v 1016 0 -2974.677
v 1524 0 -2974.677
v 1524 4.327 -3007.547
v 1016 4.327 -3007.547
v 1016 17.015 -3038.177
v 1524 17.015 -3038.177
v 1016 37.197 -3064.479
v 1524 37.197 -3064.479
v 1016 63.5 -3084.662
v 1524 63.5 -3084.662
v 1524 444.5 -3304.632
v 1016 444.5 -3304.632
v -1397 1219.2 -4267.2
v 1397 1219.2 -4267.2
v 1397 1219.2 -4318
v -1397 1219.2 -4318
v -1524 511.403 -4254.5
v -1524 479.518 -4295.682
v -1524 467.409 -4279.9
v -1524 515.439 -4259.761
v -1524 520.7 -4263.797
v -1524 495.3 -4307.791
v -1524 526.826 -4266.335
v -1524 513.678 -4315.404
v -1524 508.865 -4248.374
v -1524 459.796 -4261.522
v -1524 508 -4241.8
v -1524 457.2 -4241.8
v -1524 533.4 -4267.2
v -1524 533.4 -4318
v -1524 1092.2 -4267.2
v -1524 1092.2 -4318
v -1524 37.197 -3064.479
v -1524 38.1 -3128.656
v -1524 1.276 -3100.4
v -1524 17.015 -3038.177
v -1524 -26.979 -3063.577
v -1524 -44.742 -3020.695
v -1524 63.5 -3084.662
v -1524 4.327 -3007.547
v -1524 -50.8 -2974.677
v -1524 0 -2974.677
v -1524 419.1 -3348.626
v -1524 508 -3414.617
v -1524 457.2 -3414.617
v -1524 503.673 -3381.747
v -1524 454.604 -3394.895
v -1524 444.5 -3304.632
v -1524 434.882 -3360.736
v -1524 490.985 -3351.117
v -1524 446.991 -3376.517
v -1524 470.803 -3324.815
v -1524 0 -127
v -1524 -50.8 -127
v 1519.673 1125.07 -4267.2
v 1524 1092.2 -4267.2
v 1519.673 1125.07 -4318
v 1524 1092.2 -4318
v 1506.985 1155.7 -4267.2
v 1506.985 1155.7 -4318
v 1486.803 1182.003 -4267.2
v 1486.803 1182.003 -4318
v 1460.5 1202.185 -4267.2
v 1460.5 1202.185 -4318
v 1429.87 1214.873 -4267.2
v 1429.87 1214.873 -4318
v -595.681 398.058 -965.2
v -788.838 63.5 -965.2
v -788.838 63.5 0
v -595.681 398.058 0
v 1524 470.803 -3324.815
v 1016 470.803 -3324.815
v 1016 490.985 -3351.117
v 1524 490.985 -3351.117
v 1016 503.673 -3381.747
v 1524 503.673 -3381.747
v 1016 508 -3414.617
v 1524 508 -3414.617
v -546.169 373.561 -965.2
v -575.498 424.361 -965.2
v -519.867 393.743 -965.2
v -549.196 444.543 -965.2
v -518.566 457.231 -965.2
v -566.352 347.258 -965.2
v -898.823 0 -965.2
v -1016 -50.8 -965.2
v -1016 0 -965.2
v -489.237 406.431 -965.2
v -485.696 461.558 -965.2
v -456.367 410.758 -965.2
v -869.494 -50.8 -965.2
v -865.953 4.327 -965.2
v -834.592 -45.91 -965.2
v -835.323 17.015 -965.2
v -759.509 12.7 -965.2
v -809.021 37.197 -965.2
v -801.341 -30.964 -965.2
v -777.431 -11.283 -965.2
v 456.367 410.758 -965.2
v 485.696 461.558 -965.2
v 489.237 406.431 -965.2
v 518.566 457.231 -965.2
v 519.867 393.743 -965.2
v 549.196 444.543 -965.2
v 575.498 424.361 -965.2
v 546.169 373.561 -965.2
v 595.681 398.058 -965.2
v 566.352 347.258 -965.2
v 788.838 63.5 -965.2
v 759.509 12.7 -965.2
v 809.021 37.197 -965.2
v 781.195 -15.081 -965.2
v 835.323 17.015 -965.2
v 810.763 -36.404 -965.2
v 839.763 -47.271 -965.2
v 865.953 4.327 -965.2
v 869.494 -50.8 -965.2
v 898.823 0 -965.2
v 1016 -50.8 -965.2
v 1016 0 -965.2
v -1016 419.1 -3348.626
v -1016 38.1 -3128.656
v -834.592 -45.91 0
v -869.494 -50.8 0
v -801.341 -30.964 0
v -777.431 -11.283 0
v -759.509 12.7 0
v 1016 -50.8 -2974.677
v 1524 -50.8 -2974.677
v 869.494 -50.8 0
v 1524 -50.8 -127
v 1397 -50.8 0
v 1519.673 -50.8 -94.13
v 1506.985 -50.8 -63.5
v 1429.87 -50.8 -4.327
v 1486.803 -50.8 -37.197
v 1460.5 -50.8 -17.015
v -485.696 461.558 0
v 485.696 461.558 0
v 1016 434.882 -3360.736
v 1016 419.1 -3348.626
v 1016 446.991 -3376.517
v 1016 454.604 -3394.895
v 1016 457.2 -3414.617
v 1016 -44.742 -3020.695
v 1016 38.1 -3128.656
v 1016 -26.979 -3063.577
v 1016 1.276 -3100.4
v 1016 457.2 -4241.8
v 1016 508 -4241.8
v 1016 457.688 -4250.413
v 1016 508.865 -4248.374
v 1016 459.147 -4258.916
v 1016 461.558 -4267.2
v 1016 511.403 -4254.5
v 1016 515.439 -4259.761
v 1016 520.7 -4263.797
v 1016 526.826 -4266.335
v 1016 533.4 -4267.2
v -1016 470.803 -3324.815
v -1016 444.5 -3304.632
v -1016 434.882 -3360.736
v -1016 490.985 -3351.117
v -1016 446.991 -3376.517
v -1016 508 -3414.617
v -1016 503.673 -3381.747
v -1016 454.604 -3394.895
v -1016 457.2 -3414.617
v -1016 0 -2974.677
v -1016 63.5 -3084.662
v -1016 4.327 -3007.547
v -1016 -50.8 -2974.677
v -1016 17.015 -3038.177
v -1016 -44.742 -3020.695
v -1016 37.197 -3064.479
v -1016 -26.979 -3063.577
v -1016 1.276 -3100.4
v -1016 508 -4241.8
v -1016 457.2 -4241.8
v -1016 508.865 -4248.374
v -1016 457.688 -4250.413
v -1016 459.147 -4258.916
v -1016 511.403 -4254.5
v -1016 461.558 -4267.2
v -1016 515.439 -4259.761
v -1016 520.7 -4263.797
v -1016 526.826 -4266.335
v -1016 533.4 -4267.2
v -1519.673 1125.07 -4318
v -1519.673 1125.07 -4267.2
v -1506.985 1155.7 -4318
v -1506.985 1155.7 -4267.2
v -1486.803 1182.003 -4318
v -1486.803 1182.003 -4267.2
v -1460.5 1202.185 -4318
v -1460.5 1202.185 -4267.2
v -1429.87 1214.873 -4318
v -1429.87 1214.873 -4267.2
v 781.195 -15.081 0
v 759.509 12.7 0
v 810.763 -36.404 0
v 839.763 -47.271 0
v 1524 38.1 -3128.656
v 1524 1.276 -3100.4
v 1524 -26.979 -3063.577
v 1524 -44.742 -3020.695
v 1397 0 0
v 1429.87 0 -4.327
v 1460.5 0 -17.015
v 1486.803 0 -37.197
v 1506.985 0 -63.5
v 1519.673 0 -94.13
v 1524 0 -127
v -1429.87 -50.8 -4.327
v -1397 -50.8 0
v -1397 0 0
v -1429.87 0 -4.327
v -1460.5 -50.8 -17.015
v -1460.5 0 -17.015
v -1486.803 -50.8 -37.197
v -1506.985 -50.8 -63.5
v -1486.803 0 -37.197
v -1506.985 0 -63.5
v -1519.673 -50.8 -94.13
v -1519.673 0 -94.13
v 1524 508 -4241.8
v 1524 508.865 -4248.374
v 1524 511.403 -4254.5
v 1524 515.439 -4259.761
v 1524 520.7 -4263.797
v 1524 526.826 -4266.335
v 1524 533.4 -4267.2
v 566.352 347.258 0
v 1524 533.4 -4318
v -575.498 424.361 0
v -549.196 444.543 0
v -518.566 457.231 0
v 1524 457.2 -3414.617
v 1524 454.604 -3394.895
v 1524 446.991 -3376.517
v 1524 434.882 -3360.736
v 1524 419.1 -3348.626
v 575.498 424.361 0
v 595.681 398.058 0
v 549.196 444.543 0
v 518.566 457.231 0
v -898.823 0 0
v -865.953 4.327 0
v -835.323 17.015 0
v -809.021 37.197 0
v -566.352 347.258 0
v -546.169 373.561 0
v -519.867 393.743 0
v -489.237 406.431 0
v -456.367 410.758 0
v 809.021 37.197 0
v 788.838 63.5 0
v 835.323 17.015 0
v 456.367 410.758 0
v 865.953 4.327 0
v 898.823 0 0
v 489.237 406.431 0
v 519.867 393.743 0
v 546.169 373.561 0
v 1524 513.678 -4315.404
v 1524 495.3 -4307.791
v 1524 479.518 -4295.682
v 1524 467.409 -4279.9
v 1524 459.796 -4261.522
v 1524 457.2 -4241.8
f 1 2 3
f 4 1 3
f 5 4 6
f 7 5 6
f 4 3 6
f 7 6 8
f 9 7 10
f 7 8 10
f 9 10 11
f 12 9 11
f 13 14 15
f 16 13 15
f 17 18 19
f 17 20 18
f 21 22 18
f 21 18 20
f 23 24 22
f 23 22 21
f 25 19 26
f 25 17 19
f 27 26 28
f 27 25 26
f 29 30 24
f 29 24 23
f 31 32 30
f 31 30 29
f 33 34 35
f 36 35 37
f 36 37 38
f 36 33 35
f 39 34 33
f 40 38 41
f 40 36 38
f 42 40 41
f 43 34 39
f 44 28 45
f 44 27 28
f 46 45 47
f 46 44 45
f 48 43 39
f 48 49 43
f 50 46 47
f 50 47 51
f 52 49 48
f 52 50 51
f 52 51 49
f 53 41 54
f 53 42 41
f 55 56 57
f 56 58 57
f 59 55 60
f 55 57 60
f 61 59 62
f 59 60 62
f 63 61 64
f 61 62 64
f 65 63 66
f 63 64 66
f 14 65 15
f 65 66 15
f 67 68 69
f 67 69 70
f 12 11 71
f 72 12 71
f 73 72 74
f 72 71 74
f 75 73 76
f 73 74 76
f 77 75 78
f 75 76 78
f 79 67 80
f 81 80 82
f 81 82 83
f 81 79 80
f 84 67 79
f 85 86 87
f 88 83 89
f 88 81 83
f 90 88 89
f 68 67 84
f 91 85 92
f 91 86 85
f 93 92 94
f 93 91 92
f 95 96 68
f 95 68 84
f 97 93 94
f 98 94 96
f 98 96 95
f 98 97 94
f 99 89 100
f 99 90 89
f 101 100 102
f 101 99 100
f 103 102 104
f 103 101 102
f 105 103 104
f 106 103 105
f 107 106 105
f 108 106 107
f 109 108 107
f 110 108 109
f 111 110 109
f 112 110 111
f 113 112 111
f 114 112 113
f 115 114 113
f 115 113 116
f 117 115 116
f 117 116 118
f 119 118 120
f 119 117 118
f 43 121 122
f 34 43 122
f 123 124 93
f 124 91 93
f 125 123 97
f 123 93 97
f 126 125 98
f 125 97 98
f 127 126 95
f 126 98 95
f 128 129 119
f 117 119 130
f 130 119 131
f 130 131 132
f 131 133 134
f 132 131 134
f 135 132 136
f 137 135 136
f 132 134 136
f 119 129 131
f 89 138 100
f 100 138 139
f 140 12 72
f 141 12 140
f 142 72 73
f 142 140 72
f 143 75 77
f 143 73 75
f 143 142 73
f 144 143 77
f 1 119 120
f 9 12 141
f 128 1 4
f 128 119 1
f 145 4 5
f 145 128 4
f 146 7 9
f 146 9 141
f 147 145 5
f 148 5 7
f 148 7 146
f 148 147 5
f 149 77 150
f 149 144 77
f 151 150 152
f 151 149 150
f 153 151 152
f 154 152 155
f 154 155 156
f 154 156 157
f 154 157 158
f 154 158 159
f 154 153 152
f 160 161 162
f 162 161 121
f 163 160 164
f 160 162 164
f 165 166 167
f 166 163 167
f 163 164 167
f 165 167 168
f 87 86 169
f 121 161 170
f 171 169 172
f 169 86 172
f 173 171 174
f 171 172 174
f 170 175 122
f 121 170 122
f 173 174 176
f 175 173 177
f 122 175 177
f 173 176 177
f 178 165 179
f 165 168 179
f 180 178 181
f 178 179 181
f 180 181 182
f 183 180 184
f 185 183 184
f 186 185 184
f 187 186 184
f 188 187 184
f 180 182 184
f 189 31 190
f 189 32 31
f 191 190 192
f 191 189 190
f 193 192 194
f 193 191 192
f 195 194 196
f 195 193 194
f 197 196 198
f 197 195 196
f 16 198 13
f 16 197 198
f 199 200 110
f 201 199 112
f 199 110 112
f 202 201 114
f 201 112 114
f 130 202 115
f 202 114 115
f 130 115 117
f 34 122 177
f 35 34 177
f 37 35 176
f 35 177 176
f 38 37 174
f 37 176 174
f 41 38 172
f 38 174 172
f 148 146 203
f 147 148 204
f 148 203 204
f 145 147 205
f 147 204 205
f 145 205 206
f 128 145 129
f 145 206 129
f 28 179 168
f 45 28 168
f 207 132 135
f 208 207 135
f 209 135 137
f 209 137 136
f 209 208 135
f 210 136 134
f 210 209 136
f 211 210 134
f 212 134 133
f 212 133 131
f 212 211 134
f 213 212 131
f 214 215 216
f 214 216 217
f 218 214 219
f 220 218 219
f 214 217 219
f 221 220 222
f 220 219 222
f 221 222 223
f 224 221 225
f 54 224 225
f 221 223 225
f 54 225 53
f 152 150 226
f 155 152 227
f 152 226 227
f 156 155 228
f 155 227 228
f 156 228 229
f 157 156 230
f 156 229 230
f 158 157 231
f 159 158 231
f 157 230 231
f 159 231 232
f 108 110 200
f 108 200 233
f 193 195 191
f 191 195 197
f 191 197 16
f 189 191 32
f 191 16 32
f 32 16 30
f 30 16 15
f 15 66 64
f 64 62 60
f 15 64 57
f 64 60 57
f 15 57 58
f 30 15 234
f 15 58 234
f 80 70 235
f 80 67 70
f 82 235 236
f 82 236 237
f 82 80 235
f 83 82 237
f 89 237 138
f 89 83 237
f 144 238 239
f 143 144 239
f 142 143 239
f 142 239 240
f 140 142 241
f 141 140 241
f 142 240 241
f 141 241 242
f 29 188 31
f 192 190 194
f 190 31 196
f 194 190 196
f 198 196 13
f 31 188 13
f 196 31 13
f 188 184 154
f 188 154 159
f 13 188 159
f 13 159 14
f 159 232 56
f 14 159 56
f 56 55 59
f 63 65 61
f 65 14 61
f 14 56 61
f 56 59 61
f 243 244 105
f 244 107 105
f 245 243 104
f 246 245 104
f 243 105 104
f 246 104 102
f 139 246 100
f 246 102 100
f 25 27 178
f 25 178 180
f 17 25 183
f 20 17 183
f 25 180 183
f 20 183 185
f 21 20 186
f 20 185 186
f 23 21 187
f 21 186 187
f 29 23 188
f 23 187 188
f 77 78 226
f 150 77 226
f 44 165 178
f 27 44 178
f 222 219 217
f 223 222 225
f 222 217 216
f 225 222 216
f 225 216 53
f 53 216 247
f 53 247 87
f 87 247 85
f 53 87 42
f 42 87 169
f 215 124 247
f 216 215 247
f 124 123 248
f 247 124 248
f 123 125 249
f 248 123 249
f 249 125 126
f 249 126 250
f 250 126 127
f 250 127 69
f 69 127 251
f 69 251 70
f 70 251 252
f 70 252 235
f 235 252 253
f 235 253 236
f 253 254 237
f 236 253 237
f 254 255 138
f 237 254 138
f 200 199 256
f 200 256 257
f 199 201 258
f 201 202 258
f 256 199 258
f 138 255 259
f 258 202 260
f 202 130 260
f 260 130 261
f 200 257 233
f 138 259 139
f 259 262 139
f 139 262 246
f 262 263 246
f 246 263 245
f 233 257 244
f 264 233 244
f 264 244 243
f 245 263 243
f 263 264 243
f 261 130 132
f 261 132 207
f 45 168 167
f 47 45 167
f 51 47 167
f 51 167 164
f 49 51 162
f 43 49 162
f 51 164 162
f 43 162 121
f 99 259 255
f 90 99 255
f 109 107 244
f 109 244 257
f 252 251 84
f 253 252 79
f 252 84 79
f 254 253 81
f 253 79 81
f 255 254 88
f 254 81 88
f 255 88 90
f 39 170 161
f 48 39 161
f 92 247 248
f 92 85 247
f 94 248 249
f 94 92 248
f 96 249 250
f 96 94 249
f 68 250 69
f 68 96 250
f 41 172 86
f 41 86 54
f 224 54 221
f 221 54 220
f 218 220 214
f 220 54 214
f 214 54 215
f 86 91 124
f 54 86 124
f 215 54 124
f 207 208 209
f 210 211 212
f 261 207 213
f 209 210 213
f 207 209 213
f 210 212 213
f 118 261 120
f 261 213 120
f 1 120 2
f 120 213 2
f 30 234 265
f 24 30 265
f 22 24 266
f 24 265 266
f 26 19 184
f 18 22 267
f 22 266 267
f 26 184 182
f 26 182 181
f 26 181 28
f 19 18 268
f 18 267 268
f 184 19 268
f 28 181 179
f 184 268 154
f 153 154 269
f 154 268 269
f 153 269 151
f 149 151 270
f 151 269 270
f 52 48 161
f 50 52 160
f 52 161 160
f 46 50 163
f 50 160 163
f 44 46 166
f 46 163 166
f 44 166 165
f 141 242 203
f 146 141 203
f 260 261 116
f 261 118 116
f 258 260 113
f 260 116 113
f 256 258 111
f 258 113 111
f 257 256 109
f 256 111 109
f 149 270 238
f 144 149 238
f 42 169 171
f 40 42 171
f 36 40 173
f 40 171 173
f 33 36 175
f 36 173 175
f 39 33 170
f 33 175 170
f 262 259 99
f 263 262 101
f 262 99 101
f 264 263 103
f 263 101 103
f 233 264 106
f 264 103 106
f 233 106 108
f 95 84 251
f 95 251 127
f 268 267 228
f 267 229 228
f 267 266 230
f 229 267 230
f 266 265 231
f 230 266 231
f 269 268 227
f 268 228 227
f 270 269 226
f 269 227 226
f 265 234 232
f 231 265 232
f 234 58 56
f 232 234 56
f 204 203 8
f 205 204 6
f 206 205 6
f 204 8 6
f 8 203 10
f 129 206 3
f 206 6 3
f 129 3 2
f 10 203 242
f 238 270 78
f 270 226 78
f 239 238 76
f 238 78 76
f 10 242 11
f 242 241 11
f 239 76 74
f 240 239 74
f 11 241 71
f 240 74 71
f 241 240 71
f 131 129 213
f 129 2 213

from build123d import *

# Parameters (mm, degrees)
BOSS_EXTRUDE1_DEPTH     = 1524
CUT_EXTRUDE1_DEPTH      = 4739.580867728
CUT_EXTRUDE1_DEPTH_BACK = 4739.580867728
SKETCH2_W               = 2032
SKETCH2_H               = 3302
BOSS_EXTRUDE2_DEPTH     = 965.2
CUT_EXTRUDE2_REACH      = 4740.581
FILLET1_R               = 127
FILLET2_R               = 127


with BuildPart() as part:
    # Sketch1 → Boss-Extrude1 (new, symmetric)
    with BuildSketch(Plane(origin=(0, 0, 0), x_dir=(0, 0, -1), z_dir=(1, 0, 0))):
        with BuildLine():
            Line((0, 0), (2974.676515813, 0))
            ThreePointArc((2974.676515813, 0), (3038.176515813, 17.014773719), (3084.661742094, 63.5))
            Line((3084.661742094, 63.5), (3304.632194655, 444.5))
            ThreePointArc((3304.632194655, 444.5), (3351.117420935, 490.985226281), (3414.617420935, 508))
            Line((3414.617420935, 508), (4241.8, 508))
            ThreePointArc((4241.8, 508), (4259.760512242, 515.439487758), (4267.2, 533.4))
            Line((4267.2, 533.4), (4267.2, 1219.2))
            Line((4267.2, 1219.2), (4318, 1219.2))
            Line((4318, 1219.2), (4318, 533.4))
            ThreePointArc((4318, 533.4), (4295.681536726, 479.518463274), (4241.8, 457.2))
            Line((4241.8, 457.2), (3414.617420935, 457.2))
            ThreePointArc((3414.617420935, 457.2), (3376.517420935, 446.991135768), (3348.626285167, 419.1))
            Line((3348.626285167, 419.1), (3128.655832606, 38.1))
            ThreePointArc((3128.655832606, 38.1), (3063.576515813, -26.979316793), (2974.676515813, -50.8))
            Line((2974.676515813, -50.8), (0, -50.8))
            Line((0, -50.8), (0, 0))
        make_face()
    extrude(amount=BOSS_EXTRUDE1_DEPTH, both=True)

    # Sketch2 → Cut-Extrude1 (cut, two sides: drawn at the far end of the back side and taken through both)
    with BuildSketch(Plane(origin=(0, 0, 0), x_dir=(1, 0, 0), z_dir=(0, 1, 0)).offset(-CUT_EXTRUDE1_DEPTH_BACK)):
        with Locations((0, 2616.2)):
            Rectangle(SKETCH2_W, SKETCH2_H)
    extrude(amount=CUT_EXTRUDE1_DEPTH + CUT_EXTRUDE1_DEPTH_BACK, mode=Mode.SUBTRACT)

    # Sketch3 → Boss-Extrude2 (add)
    with BuildSketch(Plane.XY):
        Polygon((-825.5, 0), (-559.019392725, 461.557951031), (559.019392725, 461.557951031), (825.5, 0), (766.84121265, 0), (529.689999051, 410.757951031), (-529.689999051, 410.757951031), (-766.84121265, 0), align=None)
    extrude(amount=-BOSS_EXTRUDE2_DEPTH)

    # Sketch4 → Cut-Extrude2 (cut, up to next)
    with BuildSketch(Plane.XY, mode=Mode.PRIVATE) as cut_extrude2_sk1:
        Polygon((-766.84121265, 0), (-796.170606325, -50.8), (796.170606325, -50.8), (766.84121265, 0), align=None)
    cut_extrude2_tool1 = extrude(cut_extrude2_sk1.sketch, amount=-CUT_EXTRUDE2_REACH, mode=Mode.PRIVATE) & part.part
    add(cut_extrude2_tool1.solids().sort_by_distance((0, -25.558874, 0))[0], mode=Mode.SUBTRACT)

    # Fillet1
    fillet1_edges = [part.edges().sort_by_distance(p)[0] for p in [
        (-825.5, 0, -482.6),
        (-559.019392725, 461.557951031, -482.6),
        (559.019392725, 461.557951031, -482.6),
        (825.5, 0, -482.6),
        (529.689999051, 410.757951031, -482.6),
        (-529.689999051, 410.757951031, -482.6),
        (796.170606325, -50.8, -482.6),
        (-796.170606325, -50.8, -482.6),
    ]]
    fillet(fillet1_edges, radius=FILLET1_R)

    # Fillet2
    fillet2_edges = [part.edges().sort_by_distance(p)[0] for p in [
        (-1524, 1219.2, -4292.6),
        (-1524, -25.4, 0),
        (1524, 1219.2, -4292.6),
        (1524, -25.4, 0),
    ]]
    fillet(fillet2_edges, radius=FILLET2_R)


solid = part.part
